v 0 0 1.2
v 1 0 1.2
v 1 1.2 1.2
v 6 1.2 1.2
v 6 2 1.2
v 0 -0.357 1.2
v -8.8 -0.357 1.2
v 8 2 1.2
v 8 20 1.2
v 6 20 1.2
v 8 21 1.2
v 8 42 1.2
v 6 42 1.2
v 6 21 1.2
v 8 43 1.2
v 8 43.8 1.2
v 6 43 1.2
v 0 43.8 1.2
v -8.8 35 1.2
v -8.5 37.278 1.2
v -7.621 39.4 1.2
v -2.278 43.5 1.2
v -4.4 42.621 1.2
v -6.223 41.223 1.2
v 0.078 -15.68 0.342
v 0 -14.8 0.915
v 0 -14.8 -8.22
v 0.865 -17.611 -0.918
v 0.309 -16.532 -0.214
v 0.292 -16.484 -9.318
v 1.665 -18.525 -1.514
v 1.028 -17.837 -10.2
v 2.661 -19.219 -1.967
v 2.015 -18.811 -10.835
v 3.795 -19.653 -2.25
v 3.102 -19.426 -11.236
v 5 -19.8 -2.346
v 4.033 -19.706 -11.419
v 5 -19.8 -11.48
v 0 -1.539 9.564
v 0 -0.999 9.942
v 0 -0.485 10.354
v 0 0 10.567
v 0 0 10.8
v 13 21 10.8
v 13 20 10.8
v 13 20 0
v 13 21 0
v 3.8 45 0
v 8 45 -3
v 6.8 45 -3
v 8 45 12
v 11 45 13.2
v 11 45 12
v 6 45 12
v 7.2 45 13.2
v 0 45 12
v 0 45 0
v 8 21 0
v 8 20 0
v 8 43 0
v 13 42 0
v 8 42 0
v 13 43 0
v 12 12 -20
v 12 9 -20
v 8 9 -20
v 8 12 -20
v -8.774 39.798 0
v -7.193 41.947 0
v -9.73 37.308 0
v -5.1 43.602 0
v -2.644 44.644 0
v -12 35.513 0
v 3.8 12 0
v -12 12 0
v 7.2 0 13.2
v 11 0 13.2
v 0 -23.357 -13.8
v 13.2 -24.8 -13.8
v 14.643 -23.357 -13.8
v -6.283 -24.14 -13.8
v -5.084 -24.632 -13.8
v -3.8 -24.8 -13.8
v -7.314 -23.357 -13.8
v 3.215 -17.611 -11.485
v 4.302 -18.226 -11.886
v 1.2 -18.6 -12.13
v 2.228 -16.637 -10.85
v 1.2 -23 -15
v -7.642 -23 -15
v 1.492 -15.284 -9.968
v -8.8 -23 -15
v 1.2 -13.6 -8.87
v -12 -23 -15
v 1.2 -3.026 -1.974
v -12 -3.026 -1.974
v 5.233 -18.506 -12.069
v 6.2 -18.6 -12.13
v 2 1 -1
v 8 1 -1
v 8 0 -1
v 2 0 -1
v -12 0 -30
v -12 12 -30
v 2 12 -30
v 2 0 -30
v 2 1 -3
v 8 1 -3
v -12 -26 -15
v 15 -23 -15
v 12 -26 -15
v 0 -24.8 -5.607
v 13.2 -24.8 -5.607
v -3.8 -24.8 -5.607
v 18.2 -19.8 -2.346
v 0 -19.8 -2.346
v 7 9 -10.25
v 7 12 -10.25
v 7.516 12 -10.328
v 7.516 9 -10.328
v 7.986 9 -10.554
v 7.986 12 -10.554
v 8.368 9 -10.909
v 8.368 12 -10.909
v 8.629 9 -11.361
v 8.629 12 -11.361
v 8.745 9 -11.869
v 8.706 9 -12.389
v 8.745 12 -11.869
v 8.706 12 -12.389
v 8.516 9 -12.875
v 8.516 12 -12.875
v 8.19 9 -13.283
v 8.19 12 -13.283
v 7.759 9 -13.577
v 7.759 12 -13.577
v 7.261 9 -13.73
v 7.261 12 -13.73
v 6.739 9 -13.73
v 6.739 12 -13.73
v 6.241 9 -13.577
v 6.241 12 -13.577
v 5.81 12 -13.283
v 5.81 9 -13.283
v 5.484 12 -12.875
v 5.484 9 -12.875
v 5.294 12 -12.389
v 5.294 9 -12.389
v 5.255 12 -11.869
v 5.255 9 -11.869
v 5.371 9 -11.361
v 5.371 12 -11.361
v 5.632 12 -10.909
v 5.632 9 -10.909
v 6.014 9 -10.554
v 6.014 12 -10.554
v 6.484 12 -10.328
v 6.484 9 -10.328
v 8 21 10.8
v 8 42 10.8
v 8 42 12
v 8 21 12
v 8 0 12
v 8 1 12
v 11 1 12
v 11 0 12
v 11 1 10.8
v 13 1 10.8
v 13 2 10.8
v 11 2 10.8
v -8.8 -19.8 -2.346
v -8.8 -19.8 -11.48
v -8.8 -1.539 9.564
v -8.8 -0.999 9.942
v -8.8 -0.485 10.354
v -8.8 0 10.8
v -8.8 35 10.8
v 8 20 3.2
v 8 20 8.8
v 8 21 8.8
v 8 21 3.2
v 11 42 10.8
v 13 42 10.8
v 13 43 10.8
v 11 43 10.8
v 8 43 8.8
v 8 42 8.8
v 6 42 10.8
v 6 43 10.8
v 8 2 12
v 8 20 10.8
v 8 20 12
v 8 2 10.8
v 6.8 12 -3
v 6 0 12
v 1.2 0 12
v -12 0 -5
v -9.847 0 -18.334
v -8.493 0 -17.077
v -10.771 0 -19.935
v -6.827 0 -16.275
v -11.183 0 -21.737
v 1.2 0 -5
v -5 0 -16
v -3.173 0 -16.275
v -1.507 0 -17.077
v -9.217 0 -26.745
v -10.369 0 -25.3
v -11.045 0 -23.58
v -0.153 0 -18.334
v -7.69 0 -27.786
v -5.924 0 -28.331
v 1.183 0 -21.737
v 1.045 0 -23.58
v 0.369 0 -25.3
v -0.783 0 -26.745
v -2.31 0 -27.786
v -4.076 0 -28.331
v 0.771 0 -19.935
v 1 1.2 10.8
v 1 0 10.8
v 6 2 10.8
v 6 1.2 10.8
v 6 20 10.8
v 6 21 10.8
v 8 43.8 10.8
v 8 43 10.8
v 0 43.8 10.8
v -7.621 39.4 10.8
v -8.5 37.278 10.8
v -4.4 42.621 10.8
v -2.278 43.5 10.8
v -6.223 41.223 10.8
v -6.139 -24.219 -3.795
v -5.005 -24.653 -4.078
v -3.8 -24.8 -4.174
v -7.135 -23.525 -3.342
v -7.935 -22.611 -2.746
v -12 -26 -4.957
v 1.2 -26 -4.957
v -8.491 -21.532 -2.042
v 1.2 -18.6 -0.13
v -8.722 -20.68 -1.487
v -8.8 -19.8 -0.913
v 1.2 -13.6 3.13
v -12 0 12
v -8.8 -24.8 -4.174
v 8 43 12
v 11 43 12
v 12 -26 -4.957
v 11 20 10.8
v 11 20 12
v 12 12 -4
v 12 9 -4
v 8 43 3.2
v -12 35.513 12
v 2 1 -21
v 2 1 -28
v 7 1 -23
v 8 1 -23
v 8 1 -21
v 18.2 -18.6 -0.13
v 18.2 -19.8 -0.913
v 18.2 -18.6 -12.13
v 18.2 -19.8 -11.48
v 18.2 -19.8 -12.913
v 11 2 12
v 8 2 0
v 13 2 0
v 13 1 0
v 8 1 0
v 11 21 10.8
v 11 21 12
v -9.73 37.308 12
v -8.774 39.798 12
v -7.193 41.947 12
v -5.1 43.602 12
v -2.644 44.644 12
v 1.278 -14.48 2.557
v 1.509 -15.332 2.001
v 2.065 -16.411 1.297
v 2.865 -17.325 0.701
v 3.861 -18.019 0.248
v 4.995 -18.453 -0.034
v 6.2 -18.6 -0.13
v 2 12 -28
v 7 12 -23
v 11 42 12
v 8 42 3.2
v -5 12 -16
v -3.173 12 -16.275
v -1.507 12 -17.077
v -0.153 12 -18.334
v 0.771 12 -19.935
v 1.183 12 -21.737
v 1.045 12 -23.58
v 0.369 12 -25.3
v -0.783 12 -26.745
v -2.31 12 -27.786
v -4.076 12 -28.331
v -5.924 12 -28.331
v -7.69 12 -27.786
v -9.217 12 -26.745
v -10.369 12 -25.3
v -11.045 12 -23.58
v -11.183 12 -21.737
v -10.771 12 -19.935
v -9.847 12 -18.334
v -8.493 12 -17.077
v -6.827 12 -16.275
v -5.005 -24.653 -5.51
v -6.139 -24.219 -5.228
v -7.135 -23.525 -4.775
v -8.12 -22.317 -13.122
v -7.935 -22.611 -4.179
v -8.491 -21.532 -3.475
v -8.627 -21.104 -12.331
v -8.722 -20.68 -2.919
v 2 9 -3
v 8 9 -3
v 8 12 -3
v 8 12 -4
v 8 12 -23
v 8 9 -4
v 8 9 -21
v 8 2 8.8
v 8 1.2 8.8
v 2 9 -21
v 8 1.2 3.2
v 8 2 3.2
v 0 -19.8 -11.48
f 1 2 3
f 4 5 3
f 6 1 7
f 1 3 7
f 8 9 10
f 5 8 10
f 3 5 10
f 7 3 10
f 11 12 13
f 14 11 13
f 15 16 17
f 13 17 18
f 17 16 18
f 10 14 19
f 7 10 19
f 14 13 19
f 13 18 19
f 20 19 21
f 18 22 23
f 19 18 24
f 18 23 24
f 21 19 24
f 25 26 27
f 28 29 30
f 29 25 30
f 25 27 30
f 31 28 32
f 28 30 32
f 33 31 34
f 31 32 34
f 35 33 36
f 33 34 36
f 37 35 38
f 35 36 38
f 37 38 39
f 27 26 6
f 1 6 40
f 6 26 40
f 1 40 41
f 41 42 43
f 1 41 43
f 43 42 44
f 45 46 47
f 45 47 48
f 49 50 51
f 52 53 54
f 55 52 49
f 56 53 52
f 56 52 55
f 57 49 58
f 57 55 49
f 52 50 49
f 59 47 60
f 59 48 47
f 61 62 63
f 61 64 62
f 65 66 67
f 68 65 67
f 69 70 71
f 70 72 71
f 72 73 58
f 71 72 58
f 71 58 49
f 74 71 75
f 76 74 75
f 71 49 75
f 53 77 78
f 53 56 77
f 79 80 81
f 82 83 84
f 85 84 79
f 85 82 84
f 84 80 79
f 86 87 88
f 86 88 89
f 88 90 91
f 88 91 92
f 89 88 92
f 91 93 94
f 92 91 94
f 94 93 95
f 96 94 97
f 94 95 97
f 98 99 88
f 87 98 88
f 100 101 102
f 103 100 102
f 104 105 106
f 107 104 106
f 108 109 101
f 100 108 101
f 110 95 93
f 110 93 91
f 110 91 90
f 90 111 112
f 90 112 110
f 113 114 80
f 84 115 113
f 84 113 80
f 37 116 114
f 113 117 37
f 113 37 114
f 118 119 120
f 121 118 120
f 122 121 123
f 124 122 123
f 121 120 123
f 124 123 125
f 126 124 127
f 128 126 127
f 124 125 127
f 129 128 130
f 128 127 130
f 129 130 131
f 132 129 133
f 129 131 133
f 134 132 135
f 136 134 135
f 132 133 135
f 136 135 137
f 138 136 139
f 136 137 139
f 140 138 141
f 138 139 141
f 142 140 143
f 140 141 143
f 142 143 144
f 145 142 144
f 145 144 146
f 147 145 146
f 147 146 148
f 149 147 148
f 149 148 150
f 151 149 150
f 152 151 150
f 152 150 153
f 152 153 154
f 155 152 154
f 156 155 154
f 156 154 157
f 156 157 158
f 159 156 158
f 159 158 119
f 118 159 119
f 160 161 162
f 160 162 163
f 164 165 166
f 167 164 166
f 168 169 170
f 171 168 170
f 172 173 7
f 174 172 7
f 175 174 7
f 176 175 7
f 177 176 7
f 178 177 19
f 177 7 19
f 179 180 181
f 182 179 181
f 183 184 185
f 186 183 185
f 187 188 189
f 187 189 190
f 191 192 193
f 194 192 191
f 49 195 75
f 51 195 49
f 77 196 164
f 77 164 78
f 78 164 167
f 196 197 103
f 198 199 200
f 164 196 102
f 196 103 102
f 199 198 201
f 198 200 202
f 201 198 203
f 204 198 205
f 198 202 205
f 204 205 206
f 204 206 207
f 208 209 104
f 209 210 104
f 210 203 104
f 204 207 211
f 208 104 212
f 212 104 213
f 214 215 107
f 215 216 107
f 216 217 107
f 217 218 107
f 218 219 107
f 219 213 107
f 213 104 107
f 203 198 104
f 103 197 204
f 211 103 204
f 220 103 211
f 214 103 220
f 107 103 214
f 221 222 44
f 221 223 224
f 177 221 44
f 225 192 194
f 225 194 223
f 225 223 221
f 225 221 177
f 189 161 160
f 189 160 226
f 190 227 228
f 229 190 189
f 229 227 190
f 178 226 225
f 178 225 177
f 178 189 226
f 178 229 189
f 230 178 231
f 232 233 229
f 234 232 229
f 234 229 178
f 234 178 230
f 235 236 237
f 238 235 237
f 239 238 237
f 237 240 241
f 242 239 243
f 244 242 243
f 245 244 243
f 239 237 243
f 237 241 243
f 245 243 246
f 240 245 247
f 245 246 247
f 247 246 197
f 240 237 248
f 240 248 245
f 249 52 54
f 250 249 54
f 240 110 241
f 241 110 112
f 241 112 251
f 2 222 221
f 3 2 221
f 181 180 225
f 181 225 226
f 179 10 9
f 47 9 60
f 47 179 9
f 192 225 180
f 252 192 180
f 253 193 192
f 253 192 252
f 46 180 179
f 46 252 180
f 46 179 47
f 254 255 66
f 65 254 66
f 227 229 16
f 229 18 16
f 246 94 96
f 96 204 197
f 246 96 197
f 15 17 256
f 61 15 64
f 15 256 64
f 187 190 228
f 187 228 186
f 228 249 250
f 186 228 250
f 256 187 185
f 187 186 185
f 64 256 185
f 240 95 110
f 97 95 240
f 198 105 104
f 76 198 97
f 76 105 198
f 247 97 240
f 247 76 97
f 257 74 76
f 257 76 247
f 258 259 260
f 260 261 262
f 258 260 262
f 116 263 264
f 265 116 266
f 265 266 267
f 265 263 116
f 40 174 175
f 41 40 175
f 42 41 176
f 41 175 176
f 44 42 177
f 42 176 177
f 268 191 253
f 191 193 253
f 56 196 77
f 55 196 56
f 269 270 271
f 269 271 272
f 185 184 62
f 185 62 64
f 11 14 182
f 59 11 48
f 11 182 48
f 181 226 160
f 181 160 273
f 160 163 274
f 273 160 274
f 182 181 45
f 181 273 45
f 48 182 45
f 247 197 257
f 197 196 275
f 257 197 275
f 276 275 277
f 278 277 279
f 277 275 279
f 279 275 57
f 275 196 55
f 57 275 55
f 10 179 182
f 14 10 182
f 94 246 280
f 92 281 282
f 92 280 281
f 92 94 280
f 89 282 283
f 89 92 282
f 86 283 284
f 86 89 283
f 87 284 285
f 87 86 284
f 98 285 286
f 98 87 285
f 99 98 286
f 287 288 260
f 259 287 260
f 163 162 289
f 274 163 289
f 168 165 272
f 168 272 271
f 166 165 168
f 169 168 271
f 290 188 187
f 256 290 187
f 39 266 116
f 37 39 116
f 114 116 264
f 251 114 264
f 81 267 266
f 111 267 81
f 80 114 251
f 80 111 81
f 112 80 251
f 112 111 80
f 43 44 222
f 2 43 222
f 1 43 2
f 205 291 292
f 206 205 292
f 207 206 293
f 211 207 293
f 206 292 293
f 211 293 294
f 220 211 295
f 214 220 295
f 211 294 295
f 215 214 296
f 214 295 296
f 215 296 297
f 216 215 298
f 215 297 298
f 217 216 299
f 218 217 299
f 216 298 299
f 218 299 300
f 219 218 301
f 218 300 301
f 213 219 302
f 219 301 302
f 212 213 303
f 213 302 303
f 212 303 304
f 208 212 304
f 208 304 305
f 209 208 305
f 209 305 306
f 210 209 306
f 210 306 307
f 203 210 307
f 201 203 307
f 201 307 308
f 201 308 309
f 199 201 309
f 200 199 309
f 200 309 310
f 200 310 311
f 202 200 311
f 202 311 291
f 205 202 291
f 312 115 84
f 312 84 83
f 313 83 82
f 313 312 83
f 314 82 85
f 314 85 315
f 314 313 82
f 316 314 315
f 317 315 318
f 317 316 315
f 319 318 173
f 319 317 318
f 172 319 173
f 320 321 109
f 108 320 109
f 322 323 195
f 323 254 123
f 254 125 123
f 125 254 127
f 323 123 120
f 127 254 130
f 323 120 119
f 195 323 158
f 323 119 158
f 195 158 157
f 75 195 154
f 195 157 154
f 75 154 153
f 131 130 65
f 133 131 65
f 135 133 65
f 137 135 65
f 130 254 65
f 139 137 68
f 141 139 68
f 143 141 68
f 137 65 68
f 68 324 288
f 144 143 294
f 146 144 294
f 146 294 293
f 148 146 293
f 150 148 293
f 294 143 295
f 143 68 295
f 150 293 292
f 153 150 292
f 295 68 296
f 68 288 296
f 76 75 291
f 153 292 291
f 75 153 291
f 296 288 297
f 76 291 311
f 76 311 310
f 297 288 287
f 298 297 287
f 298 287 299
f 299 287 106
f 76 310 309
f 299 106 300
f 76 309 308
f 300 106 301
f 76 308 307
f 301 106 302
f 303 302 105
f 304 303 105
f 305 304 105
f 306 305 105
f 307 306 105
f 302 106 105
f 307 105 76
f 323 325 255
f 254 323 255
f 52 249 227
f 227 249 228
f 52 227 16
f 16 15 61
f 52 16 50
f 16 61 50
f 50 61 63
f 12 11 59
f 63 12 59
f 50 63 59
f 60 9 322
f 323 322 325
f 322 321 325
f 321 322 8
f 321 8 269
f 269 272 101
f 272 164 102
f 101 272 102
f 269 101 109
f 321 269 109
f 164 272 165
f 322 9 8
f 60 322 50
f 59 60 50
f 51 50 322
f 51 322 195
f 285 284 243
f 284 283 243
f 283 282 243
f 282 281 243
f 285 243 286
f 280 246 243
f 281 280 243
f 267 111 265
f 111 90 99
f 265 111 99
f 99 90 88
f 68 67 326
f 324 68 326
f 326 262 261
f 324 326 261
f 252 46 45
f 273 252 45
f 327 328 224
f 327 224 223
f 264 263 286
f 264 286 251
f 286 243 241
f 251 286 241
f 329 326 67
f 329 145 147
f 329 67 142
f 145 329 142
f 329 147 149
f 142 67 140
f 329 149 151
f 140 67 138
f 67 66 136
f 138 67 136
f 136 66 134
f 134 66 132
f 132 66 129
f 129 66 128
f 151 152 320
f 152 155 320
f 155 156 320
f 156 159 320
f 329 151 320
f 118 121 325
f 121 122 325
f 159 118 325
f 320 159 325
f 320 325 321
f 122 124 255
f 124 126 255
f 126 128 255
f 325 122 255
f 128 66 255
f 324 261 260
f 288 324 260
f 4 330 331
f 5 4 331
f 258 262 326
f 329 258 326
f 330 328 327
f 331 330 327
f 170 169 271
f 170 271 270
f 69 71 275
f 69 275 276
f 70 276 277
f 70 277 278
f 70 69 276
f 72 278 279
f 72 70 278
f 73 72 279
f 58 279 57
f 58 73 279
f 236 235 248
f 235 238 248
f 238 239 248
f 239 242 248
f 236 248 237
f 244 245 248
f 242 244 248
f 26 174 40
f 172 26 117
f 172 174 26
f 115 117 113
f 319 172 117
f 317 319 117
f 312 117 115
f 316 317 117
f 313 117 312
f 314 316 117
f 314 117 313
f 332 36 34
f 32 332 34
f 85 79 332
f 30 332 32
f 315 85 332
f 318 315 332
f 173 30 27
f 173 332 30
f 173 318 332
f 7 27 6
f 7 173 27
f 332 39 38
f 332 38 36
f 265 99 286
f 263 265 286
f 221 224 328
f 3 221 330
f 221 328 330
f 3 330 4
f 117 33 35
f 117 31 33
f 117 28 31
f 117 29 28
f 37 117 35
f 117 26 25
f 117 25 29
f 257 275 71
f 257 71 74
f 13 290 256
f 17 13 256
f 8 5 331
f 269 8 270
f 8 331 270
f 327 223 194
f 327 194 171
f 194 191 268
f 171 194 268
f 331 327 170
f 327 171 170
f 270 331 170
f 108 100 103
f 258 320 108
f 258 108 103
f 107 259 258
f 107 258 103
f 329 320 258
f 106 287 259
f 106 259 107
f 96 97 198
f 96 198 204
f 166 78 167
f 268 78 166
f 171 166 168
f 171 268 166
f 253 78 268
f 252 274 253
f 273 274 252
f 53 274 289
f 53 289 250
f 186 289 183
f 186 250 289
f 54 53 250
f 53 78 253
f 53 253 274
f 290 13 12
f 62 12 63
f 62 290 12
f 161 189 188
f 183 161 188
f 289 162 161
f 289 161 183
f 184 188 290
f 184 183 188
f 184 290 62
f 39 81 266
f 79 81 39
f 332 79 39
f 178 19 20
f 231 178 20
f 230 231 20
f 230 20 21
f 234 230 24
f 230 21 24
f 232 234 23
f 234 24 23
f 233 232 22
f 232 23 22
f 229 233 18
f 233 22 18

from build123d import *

# Parameters (mm, degrees)
BOSS_EXTRUDE1_DEPTH       = 12
SHELL1_T                  = -1.2
SHELL1_THICKNESS_2_FACE_W = 43.8
SHELL1_THICKNESS_2_FACE_H = 9.6
SHELL1_THICKNESS_2_DEPTH  = 5.8
SKETCH2_W                 = 9.6
SKETCH2_H                 = 42.6
CUT_EXTRUDE2_DEPTH        = 7
BOSS_EXTRUDE3_REACH       = 49.634
SKETCH3_W                 = 5
SKETCH3_H                 = 1
BOSS_EXTRUDE4_DEPTH       = 11.2
SHELL2_START              = -8.8
SHELL2_DEPTH              = 8.8
CUT_EXTRUDE3_REACH        = 50.88
FILLET1_R                 = 10
BOSS_EXTRUDE5_DEPTH       = 17
SKETCH7_W                 = 5
SKETCH7_H                 = 45
BOSS_EXTRUDE6_DEPTH       = 1.2
SKETCH8_W                 = 1.2
SKETCH8_H                 = 45
BOSS_EXTRUDE7_DEPTH       = 3
CHAMFER1_SIZE             = 1.2
CHAMFER2_SIZE             = 3
CHAMFER3_SIZE             = 2
SKETCH9_W                 = 1.2
SKETCH9_H                 = 45
CUT_EXTRUDE4_DEPTH        = 2
CUT_EXTRUDE6_REACH        = 58.138
BOSS_EXTRUDE10_DEPTH      = 12
CUT_EXTRUDE8_DEPTH        = 10
CUT_EXTRUDE9_REACH        = 50.002
SKETCH20_R                = 1.75
BOSS_EXTRUDE11_DEPTH      = 12
CUT_EXTRUDE10_REACH       = 53.723
SKETCH22_R                = 6.2
CHAMFER4_SIZE             = 5
BOSS_EXTRUDE12_DEPTH      = 2
CHAMFER6_SIZE             = 5
CHAMFER6_SIZE2            = 3.613034268
FILLET2_R                 = 5


# Read off the part's stored shape, not the designer's step: Shell2
# Some blends are built 0.0001 mm under size
with BuildPart() as part:
    # Sketch1 → Boss-Extrude1 (new body)
    with BuildSketch(Plane.XY):
        with BuildLine():
            Line((-10, 0), (-10, 35))
            ThreePointArc((-10, 35), (-7.071067812, 42.071067812), (0, 45))
            Line((0, 45), (8, 45))
            Line((8, 45), (8, 0))
            Line((8, 0), (0, 0))
            Line((0, 0), (-10, 0))
        make_face()
    extrude(amount=BOSS_EXTRUDE1_DEPTH)

    # Shell1
    shell1_openings = [part.faces().sort_by_distance(p)[0] for p in [
        (-1, 0, 6),
    ]]
    offset(amount=SHELL1_T, openings=shell1_openings, kind=Kind.INTERSECTION)

    # Shell1 thickness 2 face (on inner face of the shell) → Shell1 thickness 2 (add)
    with BuildSketch(Plane(origin=(6.8, 21.9, 6), x_dir=(0, 1, 0), z_dir=(1, 0, 0))):
        Rectangle(SHELL1_THICKNESS_2_FACE_W, SHELL1_THICKNESS_2_FACE_H)
    extrude(amount=-SHELL1_THICKNESS_2_DEPTH)

    # Sketch2 → Cut-Extrude2 (cut)
    with BuildSketch(Plane(origin=(8, 0, 0), x_dir=(0, 0, -1), z_dir=(1, 0, 0))):
        with Locations((-6, 22.5)):
            Rectangle(SKETCH2_W, SKETCH2_H)
    extrude(amount=-CUT_EXTRUDE2_DEPTH, mode=Mode.SUBTRACT)

    # Boss-Extrude3: up to this face of the body (flat: up to its plane)
    boss_extrude3_end = Plane(part.part.faces().sort_by_distance((-0.815853962, 21.94845022, 0))[0])
    # Sketch3 → Boss-Extrude3 (add, up to the picked face)
    with BuildSketch(Plane.XY.offset(12), mode=Mode.PRIVATE) as boss_extrude3_sk1:
        with Locations((10.5, 1.5)):
            Rectangle(SKETCH3_W, SKETCH3_H)
    boss_extrude3_tool1 = split(extrude(boss_extrude3_sk1.sketch, amount=-BOSS_EXTRUDE3_REACH, mode=Mode.PRIVATE), bisect_by=boss_extrude3_end, keep=Keep.BOTH, mode=Mode.PRIVATE)
    # Sketch3 → Boss-Extrude3 (add, up to the picked face)
    with BuildSketch(Plane.XY.offset(12), mode=Mode.PRIVATE) as boss_extrude3_sk2:
        with Locations((10.5, 42.5)):
            Rectangle(SKETCH3_W, SKETCH3_H)
    boss_extrude3_tool2 = split(extrude(boss_extrude3_sk2.sketch, amount=-BOSS_EXTRUDE3_REACH, mode=Mode.PRIVATE), bisect_by=boss_extrude3_end, keep=Keep.BOTH, mode=Mode.PRIVATE)
    # Sketch3 → Boss-Extrude3 (add, up to the picked face)
    with BuildSketch(Plane.XY.offset(12), mode=Mode.PRIVATE) as boss_extrude3_sk3:
        with Locations((10.5, 20.5)):
            Rectangle(SKETCH3_W, SKETCH3_H)
    boss_extrude3_tool3 = split(extrude(boss_extrude3_sk3.sketch, amount=-BOSS_EXTRUDE3_REACH, mode=Mode.PRIVATE), bisect_by=boss_extrude3_end, keep=Keep.BOTH, mode=Mode.PRIVATE)
    add(boss_extrude3_tool1.solids().sort_by(Axis((10.5, 1.5, 12), (0, 0, -1)))[0])
    add(boss_extrude3_tool2.solids().sort_by(Axis((10.5, 42.5, 12), (0, 0, -1)))[0])
    add(boss_extrude3_tool3.solids().sort_by(Axis((10.5, 20.5, 12), (0, 0, -1)))[0])

    # Sketch4 → Boss-Extrude4 (add)
    with BuildSketch(Plane.ZY.offset(10)):
        Polygon((0, 0), (-15, -23), (-15, -26), (-4.956521739, -26), (12, 0), align=None)
    extrude(amount=-BOSS_EXTRUDE4_DEPTH)

    # Shell2 outline → Shell2 (cut)
    with BuildSketch(Plane.YZ.offset(SHELL2_START)):
        Polygon((-24.8, -13.8), (-23.356724835, -13.8), (-0.356724835, 1.2), (0, 1.2), (0, 10.567353369), (-24.8, -5.606559675), align=None)
    extrude(amount=SHELL2_DEPTH, mode=Mode.SUBTRACT)

    # Sketch5 → Cut-Extrude3 (cut, up to next)
    with BuildSketch(Plane(origin=(1.2, 0, 0), x_dir=(0, 0, -1), z_dir=(1, 0, 0)), mode=Mode.PRIVATE) as cut_extrude3_sk1:
        Polygon((2.34569011, -19.8), (11.480396847, -19.8), (13.8, -23.356724835), (13.8, -24.8), (5.606559675, -24.8), align=None)
    cut_extrude3_tool1 = extrude(cut_extrude3_sk1.sketch, amount=-CUT_EXTRUDE3_REACH, mode=Mode.PRIVATE) & part.part
    add(cut_extrude3_tool1.solids().sort_by_distance((1.2, -22.269522, -8.459387))[0], mode=Mode.SUBTRACT)

    # Fillet1
    # the kernel refuses this fillet: 10 mm, written as the material it takes off along each edge
    with BuildSketch(Plane(origin=(-8.8, 0, 10.567353369), x_dir=(0, -0.8376105968305514, -0.5462677805592855), z_dir=(1, 0, 0))) as fillet1_piece_1:
        with BuildLine():
            CenterArc((1.837441188, -10), FILLET1_R, 90, 11.329607827)
            Line((-0.127087359, -0.194867283), (0, 0))
            Line((0, 0), (1.837441188, 0))
        make_face()
    extrude(amount=8.8, mode=Mode.SUBTRACT)

    # Sketch6 → Boss-Extrude5 (add)
    with BuildSketch(Plane(origin=(1.2, 0, 0), x_dir=(0, 0, -1), z_dir=(1, 0, 0))):
        Polygon((0.130434783, -18.6), (4.956521739, -26), (15, -26), (15, -23), (12.130434783, -18.6), align=None)
        Polygon((2.34569011, -19.8), (5.606559675, -24.8), (13.8, -24.8), (13.8, -23.356724835), (11.480396847, -19.8), align=None, mode=Mode.SUBTRACT)
    extrude(amount=BOSS_EXTRUDE5_DEPTH)

    # Sketch7 → Boss-Extrude6 (add)
    with BuildSketch(Plane.XY.offset(12)):
        with Locations((8.5, 22.5)):
            Rectangle(SKETCH7_W, SKETCH7_H)
    extrude(amount=BOSS_EXTRUDE6_DEPTH)

    # Sketch8 → Boss-Extrude7 (add)
    with BuildSketch(Plane(origin=(0, 0, 0), x_dir=(-1, 0, 0), z_dir=(0, 0, -1))):
        with Locations((-7.4, 22.5)):
            Rectangle(SKETCH8_W, SKETCH8_H)
    extrude(amount=BOSS_EXTRUDE7_DEPTH)

    # Chamfer1
    chamfer1_edges = [part.edges().sort_by_distance(p)[0] for p in [
        (6, 22.5, 13.2),
    ]]
    chamfer(chamfer1_edges, length=CHAMFER1_SIZE - 0.0001)  # a hair under: the kernel refuses the full size

    # Chamfer2
    chamfer2_edges = [part.edges().sort_by_distance(p)[0] for p in [
        (6.8, 22.5, 0),
    ]]
    chamfer(chamfer2_edges, length=CHAMFER2_SIZE - 0.0001)  # a hair under: the kernel refuses the full size

    # Chamfer3
    chamfer3_edges = [part.edges().sort_by_distance(p)[0] for p in [
        (8, 1.6, 1.2),
        (8, 1.6, 10.8),
        (8, 42.5, 1.2),
        (8, 42.5, 10.8),
        (8, 20.5, 1.2),
        (8, 20.5, 10.8),
    ]]
    chamfer(chamfer3_edges, length=CHAMFER3_SIZE)

    # Sketch9 → Cut-Extrude4 (cut)
    with BuildSketch(Plane(origin=(13, 0, 0), x_dir=(0, 0, -1), z_dir=(1, 0, 0))):
        with Locations((-11.4, 22.5)):
            Rectangle(SKETCH9_W, SKETCH9_H)
    extrude(amount=-CUT_EXTRUDE4_DEPTH, mode=Mode.SUBTRACT)

    # Sketch13 → Cut-Extrude6 (cut, up to next)
    with BuildSketch(Plane(origin=(0, 0, -15), x_dir=(-1, 0, 0), z_dir=(0, 0, -1)), mode=Mode.PRIVATE) as cut_extrude6_sk1:
        Polygon((-18.2, -19.8), (-12, -26), (-18.2, -26), align=None)
    cut_extrude6_tool1 = extrude(cut_extrude6_sk1.sketch, amount=-CUT_EXTRUDE6_REACH, mode=Mode.PRIVATE) & part.part
    add(cut_extrude6_tool1.solids().sort_by_distance((16.133333, -23.933333, -15))[0], mode=Mode.SUBTRACT)

    # Sketch18 → Boss-Extrude10 (add)
    with BuildSketch(Plane(origin=(0, 0, 0), x_dir=(1, 0, 0), z_dir=(0, 1, 0))):
        Polygon((8, 20), (8, 23), (-2, 23), (-2, 0), (8, 0), (8, 4), (12, 4), (12, 20), align=None)
    extrude(amount=BOSS_EXTRUDE10_DEPTH)

    # Sketch19 → Cut-Extrude8 (cut)
    with BuildSketch(Plane(origin=(12, 0, 0), x_dir=(0, 0, -1), z_dir=(1, 0, 0))):
        Polygon((21, 9), (3, 9), (3, 1), (1, 1), (1, 0), (23, 0), (23, 1), (21, 1), align=None)
    extrude(amount=-CUT_EXTRUDE8_DEPTH, mode=Mode.SUBTRACT)

    # Sketch20 → Cut-Extrude9 (cut, up to next)
    with BuildSketch(Plane(origin=(0, 12, 0), x_dir=(1, 0, 0), z_dir=(0, 1, 0)), mode=Mode.PRIVATE) as cut_extrude9_sk1:
        with Locations(Location((7, 12, 0), (0, 0, 270))):
            Circle(SKETCH20_R)
    cut_extrude9_tool1 = extrude(cut_extrude9_sk1.sketch, amount=-CUT_EXTRUDE9_REACH, mode=Mode.PRIVATE) & part.part
    add(cut_extrude9_tool1.solids().sort_by_distance((7, 12, -12))[0], mode=Mode.SUBTRACT)

    # Sketch21 → Boss-Extrude11 (add)
    with BuildSketch(Plane(origin=(0, 12, 0), x_dir=(1, 0, 0), z_dir=(0, 1, 0))):
        Polygon((2, 15), (-2, 15), (-2, 0), (-12, 0), (-12, 15), (-12, 30), (2, 30), align=None)
    extrude(amount=-BOSS_EXTRUDE11_DEPTH)

    # Sketch22 → Cut-Extrude10 (cut, up to next)
    with BuildSketch(Plane(origin=(0, 12, 0), x_dir=(1, 0, 0), z_dir=(0, 1, 0)), mode=Mode.PRIVATE) as cut_extrude10_sk1:
        with Locations(Location((-5, 22.2, 0), (0, 0, 270))):
            Circle(SKETCH22_R)
    cut_extrude10_tool1 = extrude(cut_extrude10_sk1.sketch, amount=-CUT_EXTRUDE10_REACH, mode=Mode.PRIVATE) & part.part
    add(cut_extrude10_tool1.solids().sort_by_distance((-5, 12, -22.2))[0], mode=Mode.SUBTRACT)

    # Chamfer4
    chamfer4_edges = [part.edges().sort_by_distance(p)[0] for p in [
        (2, 6.5, -23),
    ]]
    chamfer(chamfer4_edges, length=CHAMFER4_SIZE)

    # Sketch24 → Boss-Extrude12 (add)
    with BuildSketch(Plane.ZY.offset(10)):
        Polygon((-15, -26), (-4.956521739, -26), (12, 0), (12, 35), (0, 35), (0, 0), (-15, -23), align=None)
    extrude(amount=BOSS_EXTRUDE12_DEPTH)

    # Chamfer5
    # the kernel refuses this chamfer: 3 mm, written as the material it adds along each edge
    with BuildSketch(Plane(origin=(-10, 35, 0), x_dir=(0.15107271511055767, 0.9885226526231577, 0), z_dir=(0, 0, 1))) as chamfer5_piece_1_section:
        with BuildLine():
            Line((2.409770926, 0), (-0.487996367, 2.700518235))
            Line((-0.487996367, 2.700518235), (-0.547307726, 2.691453872))
            ThreePointArc((-0.547307726, 2.691453872), (-0.266526199, 1.346816234), (-0.059311359, -0.009064363))
            Line((-0.059311359, -0.009064363), (0.009064363, -0.059311359))
            ThreePointArc((0.009064363, -0.059311359), (1.203337899, 0.050019412), (2.404903392, -0.059802233))
            Line((2.404903392, -0.059802233), (2.409770926, 0))
        make_face()
    chamfer5_piece_1 = extrude(amount=12, mode=Mode.PRIVATE)
    chamfer5_piece_1 = split(chamfer5_piece_1, bisect_by=Plane(origin=(-12, 35.791311863, 6), z_dir=(1, 0, 0)), keep=Keep.TOP, mode=Mode.PRIVATE)
    add(chamfer5_piece_1)

    # Chamfer6
    chamfer6_edges = [part.edges().sort_by_distance(p)[0] for p in [
        (-5.4, 0, 0),
    ]]
    chamfer6_side = [part.faces().sort_by_distance(p)[0] for p in [
        (-2.663573131, 0, -7.819292495),
    ]]
    chamfer(chamfer6_edges, length=CHAMFER6_SIZE, length2=CHAMFER6_SIZE2, reference=chamfer6_side[0])

    # Fillet2
    # the kernel refuses this fillet: 5 mm, written as the material it adds along each edge
    with BuildSketch(Plane(origin=(1.2, -18.6, -24.630434783), x_dir=(1, 0, 0), z_dir=(0, 0, 1))) as fillet2_piece_1_section:
        with BuildLine():
            CenterArc((FILLET2_R, FILLET2_R), FILLET2_R, 180, 90)
            Line((0, FILLET2_R), (0, 0))
            Line((0, 0), (FILLET2_R, 0))
        make_face()
    fillet2_piece_1 = extrude(amount=37, mode=Mode.PRIVATE)
    fillet2_piece_1 = split(fillet2_piece_1, bisect_by=Plane(origin=(2.316839695, -20.228518395, -1.192511997), z_dir=(0, 0.5462677805469222, -0.8376105968386143)), keep=Keep.TOP, mode=Mode.PRIVATE)
    fillet2_piece_1 = split(fillet2_piece_1, bisect_by=Plane(origin=(2.316839695, -14.737802215, -9.61161014), z_dir=(0, -0.5462677805469223, 0.8376105968386143)), keep=Keep.TOP, mode=Mode.PRIVATE)
    add(fillet2_piece_1)
    with BuildSketch(Plane(origin=(-8.8, -24.8, 6.893440325), x_dir=(0, 1, 0), z_dir=(0, 0, -1))) as fillet2_piece_2_section:
        with BuildLine():
            CenterArc((FILLET2_R, FILLET2_R), FILLET2_R, 180, 90)
            Line((0, FILLET2_R), (0, 0))
            Line((0, 0), (FILLET2_R, 0))
        make_face()
    fillet2_piece_2 = extrude(amount=33.193440325, mode=Mode.PRIVATE)
    fillet2_piece_2 = split(fillet2_piece_2, bisect_by=Plane(origin=(-7.705272572, -26.311851744, -5.159903312), z_dir=(0, 0.5462677805469222, -0.8376105968386143)), keep=Keep.TOP, mode=Mode.PRIVATE)
    fillet2_piece_2 = split(fillet2_piece_2, bisect_by=Plane(origin=(-7.705272572, -23.651485488, -15), z_dir=(0, 0, 1)), keep=Keep.TOP, mode=Mode.PRIVATE)
    fillet2_piece_2 = split(fillet2_piece_2, bisect_by=Plane(origin=(-7.705272572, -20.821135564, -13.579001455), z_dir=(0, -0.5462677805469223, 0.8376105968386143)), keep=Keep.TOP, mode=Mode.PRIVATE)
    add(fillet2_piece_2)
    # the kernel refuses this fillet: 5 mm, written as the material it takes off along each edge
    with BuildSketch(Plane(origin=(0, -19.8, -23.980396847), x_dir=(1, 0, 0), z_dir=(0, 0, 1))) as fillet2_2_piece_1_section:
        with BuildLine():
            CenterArc((FILLET2_R, FILLET2_R), FILLET2_R, 180, 90)
            Line((0, FILLET2_R), (0, 0))
            Line((0, 0), (FILLET2_R, 0))
        make_face()
    fillet2_2_piece_1 = extrude(amount=34.134706737, mode=Mode.PRIVATE)
    fillet2_2_piece_1 = split(fillet2_2_piece_1, bisect_by=Plane(origin=(1.116839695, -20.772997059, -2.980253409), z_dir=(0, 0.5462677805469219, -0.8376105968386146)), keep=Keep.TOP, mode=Mode.PRIVATE)
    fillet2_2_piece_1 = split(fillet2_2_piece_1, bisect_by=Plane(origin=(1.116839695, -16.593323552, -9.38908612), z_dir=(0, -0.5462677805469225, 0.8376105968386142)), keep=Keep.TOP, mode=Mode.PRIVATE)
    add(fillet2_2_piece_1, mode=Mode.SUBTRACT)


solid = part.part
